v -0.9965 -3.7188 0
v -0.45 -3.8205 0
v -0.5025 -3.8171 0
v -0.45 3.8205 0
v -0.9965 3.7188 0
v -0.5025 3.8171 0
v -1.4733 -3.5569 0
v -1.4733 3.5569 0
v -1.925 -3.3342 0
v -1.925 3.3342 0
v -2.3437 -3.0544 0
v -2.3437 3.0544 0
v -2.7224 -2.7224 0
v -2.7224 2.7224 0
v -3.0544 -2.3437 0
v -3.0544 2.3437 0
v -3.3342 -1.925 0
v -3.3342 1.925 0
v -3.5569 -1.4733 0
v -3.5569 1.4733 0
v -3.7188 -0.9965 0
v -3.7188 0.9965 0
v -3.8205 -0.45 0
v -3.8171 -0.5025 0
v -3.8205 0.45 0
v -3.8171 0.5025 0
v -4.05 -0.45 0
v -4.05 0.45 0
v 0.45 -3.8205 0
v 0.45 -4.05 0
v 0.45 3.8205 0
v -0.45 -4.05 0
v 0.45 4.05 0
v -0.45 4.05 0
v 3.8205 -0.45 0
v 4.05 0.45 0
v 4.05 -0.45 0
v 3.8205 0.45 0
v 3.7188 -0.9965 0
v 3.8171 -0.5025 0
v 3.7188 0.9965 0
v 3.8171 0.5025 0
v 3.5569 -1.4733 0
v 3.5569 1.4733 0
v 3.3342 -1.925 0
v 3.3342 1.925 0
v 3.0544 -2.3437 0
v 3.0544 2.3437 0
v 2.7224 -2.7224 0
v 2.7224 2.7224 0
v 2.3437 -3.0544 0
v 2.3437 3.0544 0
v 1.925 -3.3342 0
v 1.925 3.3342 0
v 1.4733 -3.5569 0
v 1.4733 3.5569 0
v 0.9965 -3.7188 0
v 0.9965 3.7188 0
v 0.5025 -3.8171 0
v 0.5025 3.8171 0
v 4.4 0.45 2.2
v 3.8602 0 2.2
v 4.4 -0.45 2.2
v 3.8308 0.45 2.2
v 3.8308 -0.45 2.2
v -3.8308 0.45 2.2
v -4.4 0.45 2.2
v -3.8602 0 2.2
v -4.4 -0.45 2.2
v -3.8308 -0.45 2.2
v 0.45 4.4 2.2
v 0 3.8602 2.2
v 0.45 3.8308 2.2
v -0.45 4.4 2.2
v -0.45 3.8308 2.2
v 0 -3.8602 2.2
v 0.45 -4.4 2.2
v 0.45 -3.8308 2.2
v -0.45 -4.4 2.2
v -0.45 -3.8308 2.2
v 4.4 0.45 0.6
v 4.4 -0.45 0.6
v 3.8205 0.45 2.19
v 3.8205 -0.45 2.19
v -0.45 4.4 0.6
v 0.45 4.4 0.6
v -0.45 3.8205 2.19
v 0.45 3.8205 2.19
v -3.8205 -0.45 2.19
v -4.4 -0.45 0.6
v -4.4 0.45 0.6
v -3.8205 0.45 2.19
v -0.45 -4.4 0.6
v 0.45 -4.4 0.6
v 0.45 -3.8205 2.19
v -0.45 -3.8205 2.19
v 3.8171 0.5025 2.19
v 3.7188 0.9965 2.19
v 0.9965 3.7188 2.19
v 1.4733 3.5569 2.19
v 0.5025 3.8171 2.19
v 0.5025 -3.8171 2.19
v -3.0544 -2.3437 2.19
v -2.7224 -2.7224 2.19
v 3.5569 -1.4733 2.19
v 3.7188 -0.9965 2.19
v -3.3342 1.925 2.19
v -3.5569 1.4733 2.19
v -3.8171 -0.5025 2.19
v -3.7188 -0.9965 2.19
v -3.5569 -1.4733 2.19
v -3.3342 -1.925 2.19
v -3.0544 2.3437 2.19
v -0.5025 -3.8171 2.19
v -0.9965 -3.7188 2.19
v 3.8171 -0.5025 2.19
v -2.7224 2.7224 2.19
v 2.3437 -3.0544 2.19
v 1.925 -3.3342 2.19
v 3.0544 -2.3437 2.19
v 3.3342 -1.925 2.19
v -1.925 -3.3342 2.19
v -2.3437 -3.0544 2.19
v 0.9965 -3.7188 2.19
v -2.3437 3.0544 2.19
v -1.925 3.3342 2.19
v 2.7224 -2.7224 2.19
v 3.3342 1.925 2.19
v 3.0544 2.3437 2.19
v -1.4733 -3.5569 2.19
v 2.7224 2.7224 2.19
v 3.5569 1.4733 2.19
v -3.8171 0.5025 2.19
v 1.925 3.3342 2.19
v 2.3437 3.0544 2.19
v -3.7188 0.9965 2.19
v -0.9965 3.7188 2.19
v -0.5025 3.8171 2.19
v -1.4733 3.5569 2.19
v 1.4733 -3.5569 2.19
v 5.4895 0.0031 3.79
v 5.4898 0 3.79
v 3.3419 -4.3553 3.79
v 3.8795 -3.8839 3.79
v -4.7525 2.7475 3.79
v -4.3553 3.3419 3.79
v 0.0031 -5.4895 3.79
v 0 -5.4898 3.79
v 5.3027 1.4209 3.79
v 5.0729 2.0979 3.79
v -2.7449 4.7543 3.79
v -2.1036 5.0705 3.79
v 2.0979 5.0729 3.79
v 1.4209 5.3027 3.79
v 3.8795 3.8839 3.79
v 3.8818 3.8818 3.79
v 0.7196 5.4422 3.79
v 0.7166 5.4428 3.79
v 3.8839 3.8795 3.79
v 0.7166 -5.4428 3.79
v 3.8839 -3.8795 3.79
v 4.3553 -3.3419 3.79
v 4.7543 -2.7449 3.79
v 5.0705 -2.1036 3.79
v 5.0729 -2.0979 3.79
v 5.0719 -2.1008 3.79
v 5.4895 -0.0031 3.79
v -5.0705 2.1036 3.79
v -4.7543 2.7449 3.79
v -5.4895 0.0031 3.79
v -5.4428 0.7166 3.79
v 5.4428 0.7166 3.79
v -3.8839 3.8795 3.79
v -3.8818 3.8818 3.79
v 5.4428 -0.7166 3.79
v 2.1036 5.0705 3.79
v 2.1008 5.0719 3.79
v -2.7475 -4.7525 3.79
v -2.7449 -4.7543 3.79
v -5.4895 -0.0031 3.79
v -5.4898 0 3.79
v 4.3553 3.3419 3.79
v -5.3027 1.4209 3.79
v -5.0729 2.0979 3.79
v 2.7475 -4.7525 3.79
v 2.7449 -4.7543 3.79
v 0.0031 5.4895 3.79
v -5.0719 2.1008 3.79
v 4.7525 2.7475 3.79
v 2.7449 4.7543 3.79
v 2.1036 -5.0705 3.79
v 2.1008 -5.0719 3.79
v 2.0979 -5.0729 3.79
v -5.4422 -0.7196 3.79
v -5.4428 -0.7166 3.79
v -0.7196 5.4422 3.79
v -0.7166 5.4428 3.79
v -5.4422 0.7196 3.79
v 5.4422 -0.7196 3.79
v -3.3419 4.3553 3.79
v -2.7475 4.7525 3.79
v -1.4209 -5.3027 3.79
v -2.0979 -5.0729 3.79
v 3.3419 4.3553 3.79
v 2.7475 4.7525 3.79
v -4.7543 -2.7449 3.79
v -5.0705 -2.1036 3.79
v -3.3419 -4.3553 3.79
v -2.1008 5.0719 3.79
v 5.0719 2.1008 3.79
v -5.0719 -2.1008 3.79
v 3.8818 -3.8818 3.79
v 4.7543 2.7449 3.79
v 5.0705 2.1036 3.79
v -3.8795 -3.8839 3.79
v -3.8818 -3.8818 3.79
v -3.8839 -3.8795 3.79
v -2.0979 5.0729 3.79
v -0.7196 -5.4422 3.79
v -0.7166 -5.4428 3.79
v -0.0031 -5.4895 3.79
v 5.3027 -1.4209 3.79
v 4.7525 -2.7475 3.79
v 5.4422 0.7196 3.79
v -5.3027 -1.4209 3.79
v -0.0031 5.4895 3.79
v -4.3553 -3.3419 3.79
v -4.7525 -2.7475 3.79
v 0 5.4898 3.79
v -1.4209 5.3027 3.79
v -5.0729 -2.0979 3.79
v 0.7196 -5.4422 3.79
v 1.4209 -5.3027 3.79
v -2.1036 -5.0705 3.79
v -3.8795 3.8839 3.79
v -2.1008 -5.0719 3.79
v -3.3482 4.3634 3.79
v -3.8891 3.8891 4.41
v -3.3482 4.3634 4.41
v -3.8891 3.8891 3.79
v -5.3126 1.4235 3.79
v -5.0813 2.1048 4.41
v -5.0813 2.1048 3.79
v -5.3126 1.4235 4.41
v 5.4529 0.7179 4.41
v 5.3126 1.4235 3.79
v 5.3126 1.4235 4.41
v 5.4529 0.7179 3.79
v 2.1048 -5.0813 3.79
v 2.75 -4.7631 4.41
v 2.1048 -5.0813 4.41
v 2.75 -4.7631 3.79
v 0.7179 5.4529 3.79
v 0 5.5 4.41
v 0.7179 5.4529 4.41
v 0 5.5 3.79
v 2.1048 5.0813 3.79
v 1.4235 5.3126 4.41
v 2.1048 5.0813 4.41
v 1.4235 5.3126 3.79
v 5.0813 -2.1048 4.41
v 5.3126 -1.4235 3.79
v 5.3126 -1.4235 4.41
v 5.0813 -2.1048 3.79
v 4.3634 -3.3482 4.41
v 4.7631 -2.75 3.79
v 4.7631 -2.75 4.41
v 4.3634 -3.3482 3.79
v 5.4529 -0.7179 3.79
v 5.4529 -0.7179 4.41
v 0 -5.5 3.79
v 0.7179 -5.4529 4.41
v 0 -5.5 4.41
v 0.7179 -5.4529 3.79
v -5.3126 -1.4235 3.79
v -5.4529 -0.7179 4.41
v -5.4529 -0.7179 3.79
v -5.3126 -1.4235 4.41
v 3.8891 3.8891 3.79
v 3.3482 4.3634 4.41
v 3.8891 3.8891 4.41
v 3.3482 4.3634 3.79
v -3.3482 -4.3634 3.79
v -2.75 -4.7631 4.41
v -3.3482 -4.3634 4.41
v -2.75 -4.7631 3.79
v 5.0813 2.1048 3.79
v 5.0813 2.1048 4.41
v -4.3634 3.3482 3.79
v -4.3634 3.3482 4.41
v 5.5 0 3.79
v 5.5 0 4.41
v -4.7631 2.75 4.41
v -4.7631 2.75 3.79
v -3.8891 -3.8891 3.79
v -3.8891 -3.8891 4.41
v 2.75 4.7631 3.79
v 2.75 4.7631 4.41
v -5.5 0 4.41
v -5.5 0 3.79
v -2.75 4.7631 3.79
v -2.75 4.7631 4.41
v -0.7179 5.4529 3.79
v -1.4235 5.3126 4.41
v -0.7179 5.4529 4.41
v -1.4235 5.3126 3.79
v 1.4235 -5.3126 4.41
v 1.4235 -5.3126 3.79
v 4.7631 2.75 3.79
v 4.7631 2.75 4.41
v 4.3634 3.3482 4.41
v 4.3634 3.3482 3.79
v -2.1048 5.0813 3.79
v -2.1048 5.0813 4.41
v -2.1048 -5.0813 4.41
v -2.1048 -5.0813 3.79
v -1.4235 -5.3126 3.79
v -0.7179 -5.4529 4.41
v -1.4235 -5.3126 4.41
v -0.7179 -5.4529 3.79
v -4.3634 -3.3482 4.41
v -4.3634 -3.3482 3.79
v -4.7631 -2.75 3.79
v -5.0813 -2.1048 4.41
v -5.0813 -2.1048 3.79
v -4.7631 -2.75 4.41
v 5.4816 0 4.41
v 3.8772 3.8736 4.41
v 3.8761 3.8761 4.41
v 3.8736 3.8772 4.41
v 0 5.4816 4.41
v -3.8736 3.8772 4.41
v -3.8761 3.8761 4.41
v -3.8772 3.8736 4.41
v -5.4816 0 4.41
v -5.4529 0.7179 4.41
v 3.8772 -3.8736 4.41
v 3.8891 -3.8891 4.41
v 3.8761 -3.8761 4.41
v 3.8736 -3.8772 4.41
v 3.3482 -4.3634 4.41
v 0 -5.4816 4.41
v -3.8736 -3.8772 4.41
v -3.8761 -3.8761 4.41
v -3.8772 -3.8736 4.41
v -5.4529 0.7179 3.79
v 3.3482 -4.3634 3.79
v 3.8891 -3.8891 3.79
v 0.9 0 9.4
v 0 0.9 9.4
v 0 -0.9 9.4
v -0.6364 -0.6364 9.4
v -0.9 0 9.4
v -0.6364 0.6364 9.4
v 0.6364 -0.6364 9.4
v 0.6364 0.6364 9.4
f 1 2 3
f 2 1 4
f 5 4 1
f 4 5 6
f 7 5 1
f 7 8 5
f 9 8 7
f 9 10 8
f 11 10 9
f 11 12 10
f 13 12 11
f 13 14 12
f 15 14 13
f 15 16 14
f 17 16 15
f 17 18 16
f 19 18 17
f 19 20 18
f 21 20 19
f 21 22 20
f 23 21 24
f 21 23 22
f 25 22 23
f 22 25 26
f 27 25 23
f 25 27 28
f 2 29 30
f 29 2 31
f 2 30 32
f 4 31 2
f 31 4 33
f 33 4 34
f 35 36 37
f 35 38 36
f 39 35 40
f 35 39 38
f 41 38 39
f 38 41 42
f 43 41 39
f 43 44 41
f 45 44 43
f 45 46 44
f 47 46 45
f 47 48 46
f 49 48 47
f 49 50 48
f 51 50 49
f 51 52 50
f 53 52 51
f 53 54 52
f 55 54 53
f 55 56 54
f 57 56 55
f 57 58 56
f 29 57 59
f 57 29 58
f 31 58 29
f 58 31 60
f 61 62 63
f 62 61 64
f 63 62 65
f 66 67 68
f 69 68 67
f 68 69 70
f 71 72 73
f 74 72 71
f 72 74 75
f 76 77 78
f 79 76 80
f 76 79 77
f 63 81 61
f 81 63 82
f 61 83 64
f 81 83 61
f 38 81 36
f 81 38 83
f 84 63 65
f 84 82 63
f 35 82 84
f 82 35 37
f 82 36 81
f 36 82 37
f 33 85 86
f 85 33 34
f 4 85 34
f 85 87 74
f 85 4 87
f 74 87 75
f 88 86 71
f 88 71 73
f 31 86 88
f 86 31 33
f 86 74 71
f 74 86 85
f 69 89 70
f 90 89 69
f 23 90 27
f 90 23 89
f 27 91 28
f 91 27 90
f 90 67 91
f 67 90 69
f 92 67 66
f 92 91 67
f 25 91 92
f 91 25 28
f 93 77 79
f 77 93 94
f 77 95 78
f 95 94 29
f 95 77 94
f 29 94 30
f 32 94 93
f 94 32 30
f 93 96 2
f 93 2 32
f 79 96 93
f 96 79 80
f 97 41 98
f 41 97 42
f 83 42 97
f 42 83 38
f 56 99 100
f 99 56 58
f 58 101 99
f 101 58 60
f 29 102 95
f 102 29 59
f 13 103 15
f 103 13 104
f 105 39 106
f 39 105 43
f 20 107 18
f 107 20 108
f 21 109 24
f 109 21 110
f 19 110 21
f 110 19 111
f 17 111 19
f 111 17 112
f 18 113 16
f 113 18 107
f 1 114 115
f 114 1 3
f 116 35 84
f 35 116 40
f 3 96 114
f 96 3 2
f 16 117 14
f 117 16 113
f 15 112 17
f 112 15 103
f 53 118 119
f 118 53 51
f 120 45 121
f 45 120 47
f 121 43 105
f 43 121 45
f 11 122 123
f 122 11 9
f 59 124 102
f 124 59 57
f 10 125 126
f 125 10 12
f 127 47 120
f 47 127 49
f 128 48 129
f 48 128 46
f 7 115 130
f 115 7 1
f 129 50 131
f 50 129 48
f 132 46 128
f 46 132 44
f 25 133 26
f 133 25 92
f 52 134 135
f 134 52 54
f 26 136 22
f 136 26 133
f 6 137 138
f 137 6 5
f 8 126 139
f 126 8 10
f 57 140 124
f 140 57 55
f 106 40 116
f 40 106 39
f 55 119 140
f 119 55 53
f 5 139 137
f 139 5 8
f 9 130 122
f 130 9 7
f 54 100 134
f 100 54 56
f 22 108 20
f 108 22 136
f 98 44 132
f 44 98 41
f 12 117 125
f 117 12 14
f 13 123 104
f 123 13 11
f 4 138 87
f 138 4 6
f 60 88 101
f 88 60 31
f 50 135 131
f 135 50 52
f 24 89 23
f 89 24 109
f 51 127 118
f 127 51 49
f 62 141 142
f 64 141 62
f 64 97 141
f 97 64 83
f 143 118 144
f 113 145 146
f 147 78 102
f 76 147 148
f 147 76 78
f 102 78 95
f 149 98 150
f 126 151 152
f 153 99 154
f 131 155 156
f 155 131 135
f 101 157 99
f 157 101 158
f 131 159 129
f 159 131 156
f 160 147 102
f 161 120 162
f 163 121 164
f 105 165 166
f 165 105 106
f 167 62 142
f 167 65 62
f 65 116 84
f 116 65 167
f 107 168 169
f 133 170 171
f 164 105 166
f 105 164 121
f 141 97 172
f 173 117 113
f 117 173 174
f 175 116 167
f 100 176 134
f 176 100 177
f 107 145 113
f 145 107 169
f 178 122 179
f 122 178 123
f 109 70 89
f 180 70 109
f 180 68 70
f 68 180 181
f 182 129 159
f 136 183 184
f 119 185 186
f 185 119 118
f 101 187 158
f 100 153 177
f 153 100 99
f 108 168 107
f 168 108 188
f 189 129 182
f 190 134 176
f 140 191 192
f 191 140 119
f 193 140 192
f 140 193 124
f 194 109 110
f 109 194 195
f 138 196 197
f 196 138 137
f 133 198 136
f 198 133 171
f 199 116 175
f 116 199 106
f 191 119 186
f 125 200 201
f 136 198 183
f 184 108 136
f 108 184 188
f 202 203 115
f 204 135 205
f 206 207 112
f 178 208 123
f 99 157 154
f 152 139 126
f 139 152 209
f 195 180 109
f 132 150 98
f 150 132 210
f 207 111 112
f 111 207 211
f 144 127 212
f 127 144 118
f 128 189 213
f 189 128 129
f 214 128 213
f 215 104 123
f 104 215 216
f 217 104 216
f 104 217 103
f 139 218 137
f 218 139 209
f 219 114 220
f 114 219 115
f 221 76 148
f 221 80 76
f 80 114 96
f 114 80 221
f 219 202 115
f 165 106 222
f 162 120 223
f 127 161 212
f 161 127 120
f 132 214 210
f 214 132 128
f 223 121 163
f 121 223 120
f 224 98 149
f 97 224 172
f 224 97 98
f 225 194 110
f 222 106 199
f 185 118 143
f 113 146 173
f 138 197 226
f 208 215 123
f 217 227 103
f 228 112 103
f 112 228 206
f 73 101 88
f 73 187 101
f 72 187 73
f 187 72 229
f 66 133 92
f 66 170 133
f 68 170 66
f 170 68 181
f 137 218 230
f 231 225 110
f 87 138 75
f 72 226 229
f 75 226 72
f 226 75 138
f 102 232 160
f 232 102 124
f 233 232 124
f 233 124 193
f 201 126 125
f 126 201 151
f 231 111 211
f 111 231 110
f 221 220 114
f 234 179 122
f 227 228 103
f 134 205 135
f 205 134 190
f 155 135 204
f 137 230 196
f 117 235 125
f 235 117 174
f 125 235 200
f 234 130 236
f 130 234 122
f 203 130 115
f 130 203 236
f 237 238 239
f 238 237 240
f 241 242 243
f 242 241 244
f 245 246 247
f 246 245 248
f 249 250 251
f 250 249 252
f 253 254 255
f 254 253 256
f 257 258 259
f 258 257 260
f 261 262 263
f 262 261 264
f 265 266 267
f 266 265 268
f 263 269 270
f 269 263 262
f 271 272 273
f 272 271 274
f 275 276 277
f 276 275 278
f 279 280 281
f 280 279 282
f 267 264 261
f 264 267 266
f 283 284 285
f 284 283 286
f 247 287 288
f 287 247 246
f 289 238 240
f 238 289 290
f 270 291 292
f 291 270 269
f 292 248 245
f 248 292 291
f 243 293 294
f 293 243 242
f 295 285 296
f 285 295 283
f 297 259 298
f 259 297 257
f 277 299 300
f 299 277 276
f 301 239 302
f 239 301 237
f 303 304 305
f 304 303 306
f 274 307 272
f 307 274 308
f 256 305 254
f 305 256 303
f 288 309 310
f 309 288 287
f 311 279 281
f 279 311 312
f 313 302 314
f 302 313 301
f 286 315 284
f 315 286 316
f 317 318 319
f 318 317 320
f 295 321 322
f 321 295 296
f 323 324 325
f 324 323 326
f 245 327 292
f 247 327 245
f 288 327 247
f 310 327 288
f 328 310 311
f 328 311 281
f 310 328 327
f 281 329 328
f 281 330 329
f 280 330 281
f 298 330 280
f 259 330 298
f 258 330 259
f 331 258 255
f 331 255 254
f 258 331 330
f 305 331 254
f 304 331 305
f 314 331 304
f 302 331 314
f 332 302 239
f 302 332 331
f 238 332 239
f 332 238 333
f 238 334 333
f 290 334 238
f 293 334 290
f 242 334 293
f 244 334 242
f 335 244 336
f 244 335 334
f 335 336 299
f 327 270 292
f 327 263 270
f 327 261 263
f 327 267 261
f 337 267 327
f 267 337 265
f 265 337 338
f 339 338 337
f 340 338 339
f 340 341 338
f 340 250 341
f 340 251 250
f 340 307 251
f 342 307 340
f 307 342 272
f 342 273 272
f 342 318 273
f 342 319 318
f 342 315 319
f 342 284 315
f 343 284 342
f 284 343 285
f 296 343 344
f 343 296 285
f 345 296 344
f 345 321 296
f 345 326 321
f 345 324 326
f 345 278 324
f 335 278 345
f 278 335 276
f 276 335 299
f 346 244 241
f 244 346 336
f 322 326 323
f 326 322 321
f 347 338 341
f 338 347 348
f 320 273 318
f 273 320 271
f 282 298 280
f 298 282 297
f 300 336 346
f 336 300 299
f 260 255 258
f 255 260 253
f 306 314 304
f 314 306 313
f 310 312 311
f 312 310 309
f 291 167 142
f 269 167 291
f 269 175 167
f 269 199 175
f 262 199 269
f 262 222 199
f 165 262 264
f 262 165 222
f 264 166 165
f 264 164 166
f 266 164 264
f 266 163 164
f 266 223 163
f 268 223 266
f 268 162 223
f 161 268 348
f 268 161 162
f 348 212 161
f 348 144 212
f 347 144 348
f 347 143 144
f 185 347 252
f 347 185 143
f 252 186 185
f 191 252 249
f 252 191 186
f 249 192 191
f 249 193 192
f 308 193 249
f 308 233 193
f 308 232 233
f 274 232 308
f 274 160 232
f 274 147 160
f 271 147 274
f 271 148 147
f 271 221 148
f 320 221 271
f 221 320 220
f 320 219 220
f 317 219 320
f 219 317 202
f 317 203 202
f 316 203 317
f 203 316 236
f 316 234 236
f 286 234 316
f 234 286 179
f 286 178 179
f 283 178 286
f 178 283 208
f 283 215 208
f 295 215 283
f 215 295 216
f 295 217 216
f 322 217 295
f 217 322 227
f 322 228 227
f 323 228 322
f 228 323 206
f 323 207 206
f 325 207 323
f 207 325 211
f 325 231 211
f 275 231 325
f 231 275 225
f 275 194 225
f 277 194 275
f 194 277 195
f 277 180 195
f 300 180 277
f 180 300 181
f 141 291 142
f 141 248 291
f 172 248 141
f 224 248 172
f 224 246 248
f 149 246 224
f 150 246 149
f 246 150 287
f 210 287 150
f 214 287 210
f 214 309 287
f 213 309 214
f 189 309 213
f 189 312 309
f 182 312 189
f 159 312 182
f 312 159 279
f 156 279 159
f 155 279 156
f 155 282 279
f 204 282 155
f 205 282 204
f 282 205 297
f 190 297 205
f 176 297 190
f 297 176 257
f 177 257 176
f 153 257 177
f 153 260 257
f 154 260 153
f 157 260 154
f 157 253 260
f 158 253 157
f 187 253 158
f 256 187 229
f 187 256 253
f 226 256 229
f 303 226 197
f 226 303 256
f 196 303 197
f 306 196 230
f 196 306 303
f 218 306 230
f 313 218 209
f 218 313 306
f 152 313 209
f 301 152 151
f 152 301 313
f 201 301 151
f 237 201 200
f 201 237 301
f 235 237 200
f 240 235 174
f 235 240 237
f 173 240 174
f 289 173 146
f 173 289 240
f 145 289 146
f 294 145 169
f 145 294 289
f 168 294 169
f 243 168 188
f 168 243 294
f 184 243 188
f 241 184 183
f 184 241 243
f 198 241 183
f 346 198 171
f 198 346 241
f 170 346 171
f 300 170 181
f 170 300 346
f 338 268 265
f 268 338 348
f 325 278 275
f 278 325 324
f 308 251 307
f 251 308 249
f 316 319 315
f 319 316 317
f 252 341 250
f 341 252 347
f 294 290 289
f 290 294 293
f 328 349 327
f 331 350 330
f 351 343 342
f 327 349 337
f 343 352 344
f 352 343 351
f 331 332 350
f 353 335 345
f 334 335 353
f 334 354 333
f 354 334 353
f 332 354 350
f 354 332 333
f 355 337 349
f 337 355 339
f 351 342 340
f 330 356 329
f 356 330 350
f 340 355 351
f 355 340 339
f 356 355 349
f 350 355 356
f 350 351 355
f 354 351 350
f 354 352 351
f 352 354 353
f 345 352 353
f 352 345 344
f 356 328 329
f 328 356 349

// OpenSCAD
// Cousin Camp 2026 -- press-fit gem for the crown.
//
// Seats into the crown's stone holes. The plug is a straight cylinder rather
// than a taper: a taper wedges at an unpredictable depth and leaves the lip
// standing proud, whereas a straight plug always seats flush and the crush
// ribs supply the grip. A drop of glue is optional insurance, not required.
//
// Sizing is split deliberately. The footprint scales to whatever oval the
// crown asks for, but the plug keeps its absolute height so it always reaches
// through the band wall, and the faceted top scales by the SMALLER of the two
// footprint dimensions so small accent stones stay flat instead of becoming
// spikes.
//
// Printed plug-down. Nothing exceeds a 45 degree overhang, so no supports --
// but use a brim, the footprint is small.

// === Parameters ===
gem_w     = 8.0;    // horizontal size on the head; must match crown.scad gems[]
gem_h     = 8.0;    // vertical size on the head
nominal   = 8.0;    // the size this stone is modelled at before scaling

plug_d    = 7.7;    // clearance fit through a nominal 8 mm hole
plug_h    = 2.2;    // just under the band wall, so nothing protrudes inside

rib_n     = 4;      // crush ribs that grip the hole
rib_out   = 0.35;
rib_w     = 0.9;

lip_d     = 11.0;   // seats against the crown face
lip_h     = 0.6;
chamfer_h = 1.6;    // 45 degrees from plug up to lip

facets    = 8;      // octagonal, like a cut stone
top_h     = 5.0;    // keeps the crown facets at ~43 degrees
top_tip   = 1.8;    // blunt -- this sits near a child's forehead

$fn       = 48;

// === Derived ===
// X is vertical on the head, Y is horizontal, matching the crown's hole frame.
sx   = gem_h / nominal;
sy   = gem_w / nominal;
sz   = min(gem_w, gem_h) / nominal;
seat = plug_h + chamfer_h + lip_h;

// === Assembly ===
gem();

module gem() {
    scale([sx, sy, 1]) seat_body();
    translate([0, 0, seat - 0.01])
        scale([sx, sy, sz])
            cylinder(h = top_h + 0.01, d1 = lip_d, d2 = top_tip, $fn = facets);
}

module seat_body() {
    plug();
    translate([0, 0, plug_h - 0.01])
        cylinder(h = chamfer_h + 0.01, d1 = plug_d, d2 = lip_d);
    translate([0, 0, plug_h + chamfer_h - 0.01])
        cylinder(h = lip_h + 0.02, d = lip_d);
}

module plug() {
    cylinder(h = plug_h, d = plug_d);
    for (i = [0 : rib_n - 1])
        rotate([0, 0, i * 360 / rib_n])
            rib();
}

// Rib ramps out from flush to full height over the first 0.6 mm, so the gem
// enters the hole square before the ribs start to bite.
module rib() {
    w    = 0.4 + rib_out;
    x    = plug_d/2 - 0.2;
    lead = 0.6;
    hull() {
        translate([x, -rib_w/2, lead]) cube([w, rib_w, plug_h - lead]);
        translate([x, -rib_w/2, 0])    cube([w - rib_out, rib_w, 0.01]);
    }
}
